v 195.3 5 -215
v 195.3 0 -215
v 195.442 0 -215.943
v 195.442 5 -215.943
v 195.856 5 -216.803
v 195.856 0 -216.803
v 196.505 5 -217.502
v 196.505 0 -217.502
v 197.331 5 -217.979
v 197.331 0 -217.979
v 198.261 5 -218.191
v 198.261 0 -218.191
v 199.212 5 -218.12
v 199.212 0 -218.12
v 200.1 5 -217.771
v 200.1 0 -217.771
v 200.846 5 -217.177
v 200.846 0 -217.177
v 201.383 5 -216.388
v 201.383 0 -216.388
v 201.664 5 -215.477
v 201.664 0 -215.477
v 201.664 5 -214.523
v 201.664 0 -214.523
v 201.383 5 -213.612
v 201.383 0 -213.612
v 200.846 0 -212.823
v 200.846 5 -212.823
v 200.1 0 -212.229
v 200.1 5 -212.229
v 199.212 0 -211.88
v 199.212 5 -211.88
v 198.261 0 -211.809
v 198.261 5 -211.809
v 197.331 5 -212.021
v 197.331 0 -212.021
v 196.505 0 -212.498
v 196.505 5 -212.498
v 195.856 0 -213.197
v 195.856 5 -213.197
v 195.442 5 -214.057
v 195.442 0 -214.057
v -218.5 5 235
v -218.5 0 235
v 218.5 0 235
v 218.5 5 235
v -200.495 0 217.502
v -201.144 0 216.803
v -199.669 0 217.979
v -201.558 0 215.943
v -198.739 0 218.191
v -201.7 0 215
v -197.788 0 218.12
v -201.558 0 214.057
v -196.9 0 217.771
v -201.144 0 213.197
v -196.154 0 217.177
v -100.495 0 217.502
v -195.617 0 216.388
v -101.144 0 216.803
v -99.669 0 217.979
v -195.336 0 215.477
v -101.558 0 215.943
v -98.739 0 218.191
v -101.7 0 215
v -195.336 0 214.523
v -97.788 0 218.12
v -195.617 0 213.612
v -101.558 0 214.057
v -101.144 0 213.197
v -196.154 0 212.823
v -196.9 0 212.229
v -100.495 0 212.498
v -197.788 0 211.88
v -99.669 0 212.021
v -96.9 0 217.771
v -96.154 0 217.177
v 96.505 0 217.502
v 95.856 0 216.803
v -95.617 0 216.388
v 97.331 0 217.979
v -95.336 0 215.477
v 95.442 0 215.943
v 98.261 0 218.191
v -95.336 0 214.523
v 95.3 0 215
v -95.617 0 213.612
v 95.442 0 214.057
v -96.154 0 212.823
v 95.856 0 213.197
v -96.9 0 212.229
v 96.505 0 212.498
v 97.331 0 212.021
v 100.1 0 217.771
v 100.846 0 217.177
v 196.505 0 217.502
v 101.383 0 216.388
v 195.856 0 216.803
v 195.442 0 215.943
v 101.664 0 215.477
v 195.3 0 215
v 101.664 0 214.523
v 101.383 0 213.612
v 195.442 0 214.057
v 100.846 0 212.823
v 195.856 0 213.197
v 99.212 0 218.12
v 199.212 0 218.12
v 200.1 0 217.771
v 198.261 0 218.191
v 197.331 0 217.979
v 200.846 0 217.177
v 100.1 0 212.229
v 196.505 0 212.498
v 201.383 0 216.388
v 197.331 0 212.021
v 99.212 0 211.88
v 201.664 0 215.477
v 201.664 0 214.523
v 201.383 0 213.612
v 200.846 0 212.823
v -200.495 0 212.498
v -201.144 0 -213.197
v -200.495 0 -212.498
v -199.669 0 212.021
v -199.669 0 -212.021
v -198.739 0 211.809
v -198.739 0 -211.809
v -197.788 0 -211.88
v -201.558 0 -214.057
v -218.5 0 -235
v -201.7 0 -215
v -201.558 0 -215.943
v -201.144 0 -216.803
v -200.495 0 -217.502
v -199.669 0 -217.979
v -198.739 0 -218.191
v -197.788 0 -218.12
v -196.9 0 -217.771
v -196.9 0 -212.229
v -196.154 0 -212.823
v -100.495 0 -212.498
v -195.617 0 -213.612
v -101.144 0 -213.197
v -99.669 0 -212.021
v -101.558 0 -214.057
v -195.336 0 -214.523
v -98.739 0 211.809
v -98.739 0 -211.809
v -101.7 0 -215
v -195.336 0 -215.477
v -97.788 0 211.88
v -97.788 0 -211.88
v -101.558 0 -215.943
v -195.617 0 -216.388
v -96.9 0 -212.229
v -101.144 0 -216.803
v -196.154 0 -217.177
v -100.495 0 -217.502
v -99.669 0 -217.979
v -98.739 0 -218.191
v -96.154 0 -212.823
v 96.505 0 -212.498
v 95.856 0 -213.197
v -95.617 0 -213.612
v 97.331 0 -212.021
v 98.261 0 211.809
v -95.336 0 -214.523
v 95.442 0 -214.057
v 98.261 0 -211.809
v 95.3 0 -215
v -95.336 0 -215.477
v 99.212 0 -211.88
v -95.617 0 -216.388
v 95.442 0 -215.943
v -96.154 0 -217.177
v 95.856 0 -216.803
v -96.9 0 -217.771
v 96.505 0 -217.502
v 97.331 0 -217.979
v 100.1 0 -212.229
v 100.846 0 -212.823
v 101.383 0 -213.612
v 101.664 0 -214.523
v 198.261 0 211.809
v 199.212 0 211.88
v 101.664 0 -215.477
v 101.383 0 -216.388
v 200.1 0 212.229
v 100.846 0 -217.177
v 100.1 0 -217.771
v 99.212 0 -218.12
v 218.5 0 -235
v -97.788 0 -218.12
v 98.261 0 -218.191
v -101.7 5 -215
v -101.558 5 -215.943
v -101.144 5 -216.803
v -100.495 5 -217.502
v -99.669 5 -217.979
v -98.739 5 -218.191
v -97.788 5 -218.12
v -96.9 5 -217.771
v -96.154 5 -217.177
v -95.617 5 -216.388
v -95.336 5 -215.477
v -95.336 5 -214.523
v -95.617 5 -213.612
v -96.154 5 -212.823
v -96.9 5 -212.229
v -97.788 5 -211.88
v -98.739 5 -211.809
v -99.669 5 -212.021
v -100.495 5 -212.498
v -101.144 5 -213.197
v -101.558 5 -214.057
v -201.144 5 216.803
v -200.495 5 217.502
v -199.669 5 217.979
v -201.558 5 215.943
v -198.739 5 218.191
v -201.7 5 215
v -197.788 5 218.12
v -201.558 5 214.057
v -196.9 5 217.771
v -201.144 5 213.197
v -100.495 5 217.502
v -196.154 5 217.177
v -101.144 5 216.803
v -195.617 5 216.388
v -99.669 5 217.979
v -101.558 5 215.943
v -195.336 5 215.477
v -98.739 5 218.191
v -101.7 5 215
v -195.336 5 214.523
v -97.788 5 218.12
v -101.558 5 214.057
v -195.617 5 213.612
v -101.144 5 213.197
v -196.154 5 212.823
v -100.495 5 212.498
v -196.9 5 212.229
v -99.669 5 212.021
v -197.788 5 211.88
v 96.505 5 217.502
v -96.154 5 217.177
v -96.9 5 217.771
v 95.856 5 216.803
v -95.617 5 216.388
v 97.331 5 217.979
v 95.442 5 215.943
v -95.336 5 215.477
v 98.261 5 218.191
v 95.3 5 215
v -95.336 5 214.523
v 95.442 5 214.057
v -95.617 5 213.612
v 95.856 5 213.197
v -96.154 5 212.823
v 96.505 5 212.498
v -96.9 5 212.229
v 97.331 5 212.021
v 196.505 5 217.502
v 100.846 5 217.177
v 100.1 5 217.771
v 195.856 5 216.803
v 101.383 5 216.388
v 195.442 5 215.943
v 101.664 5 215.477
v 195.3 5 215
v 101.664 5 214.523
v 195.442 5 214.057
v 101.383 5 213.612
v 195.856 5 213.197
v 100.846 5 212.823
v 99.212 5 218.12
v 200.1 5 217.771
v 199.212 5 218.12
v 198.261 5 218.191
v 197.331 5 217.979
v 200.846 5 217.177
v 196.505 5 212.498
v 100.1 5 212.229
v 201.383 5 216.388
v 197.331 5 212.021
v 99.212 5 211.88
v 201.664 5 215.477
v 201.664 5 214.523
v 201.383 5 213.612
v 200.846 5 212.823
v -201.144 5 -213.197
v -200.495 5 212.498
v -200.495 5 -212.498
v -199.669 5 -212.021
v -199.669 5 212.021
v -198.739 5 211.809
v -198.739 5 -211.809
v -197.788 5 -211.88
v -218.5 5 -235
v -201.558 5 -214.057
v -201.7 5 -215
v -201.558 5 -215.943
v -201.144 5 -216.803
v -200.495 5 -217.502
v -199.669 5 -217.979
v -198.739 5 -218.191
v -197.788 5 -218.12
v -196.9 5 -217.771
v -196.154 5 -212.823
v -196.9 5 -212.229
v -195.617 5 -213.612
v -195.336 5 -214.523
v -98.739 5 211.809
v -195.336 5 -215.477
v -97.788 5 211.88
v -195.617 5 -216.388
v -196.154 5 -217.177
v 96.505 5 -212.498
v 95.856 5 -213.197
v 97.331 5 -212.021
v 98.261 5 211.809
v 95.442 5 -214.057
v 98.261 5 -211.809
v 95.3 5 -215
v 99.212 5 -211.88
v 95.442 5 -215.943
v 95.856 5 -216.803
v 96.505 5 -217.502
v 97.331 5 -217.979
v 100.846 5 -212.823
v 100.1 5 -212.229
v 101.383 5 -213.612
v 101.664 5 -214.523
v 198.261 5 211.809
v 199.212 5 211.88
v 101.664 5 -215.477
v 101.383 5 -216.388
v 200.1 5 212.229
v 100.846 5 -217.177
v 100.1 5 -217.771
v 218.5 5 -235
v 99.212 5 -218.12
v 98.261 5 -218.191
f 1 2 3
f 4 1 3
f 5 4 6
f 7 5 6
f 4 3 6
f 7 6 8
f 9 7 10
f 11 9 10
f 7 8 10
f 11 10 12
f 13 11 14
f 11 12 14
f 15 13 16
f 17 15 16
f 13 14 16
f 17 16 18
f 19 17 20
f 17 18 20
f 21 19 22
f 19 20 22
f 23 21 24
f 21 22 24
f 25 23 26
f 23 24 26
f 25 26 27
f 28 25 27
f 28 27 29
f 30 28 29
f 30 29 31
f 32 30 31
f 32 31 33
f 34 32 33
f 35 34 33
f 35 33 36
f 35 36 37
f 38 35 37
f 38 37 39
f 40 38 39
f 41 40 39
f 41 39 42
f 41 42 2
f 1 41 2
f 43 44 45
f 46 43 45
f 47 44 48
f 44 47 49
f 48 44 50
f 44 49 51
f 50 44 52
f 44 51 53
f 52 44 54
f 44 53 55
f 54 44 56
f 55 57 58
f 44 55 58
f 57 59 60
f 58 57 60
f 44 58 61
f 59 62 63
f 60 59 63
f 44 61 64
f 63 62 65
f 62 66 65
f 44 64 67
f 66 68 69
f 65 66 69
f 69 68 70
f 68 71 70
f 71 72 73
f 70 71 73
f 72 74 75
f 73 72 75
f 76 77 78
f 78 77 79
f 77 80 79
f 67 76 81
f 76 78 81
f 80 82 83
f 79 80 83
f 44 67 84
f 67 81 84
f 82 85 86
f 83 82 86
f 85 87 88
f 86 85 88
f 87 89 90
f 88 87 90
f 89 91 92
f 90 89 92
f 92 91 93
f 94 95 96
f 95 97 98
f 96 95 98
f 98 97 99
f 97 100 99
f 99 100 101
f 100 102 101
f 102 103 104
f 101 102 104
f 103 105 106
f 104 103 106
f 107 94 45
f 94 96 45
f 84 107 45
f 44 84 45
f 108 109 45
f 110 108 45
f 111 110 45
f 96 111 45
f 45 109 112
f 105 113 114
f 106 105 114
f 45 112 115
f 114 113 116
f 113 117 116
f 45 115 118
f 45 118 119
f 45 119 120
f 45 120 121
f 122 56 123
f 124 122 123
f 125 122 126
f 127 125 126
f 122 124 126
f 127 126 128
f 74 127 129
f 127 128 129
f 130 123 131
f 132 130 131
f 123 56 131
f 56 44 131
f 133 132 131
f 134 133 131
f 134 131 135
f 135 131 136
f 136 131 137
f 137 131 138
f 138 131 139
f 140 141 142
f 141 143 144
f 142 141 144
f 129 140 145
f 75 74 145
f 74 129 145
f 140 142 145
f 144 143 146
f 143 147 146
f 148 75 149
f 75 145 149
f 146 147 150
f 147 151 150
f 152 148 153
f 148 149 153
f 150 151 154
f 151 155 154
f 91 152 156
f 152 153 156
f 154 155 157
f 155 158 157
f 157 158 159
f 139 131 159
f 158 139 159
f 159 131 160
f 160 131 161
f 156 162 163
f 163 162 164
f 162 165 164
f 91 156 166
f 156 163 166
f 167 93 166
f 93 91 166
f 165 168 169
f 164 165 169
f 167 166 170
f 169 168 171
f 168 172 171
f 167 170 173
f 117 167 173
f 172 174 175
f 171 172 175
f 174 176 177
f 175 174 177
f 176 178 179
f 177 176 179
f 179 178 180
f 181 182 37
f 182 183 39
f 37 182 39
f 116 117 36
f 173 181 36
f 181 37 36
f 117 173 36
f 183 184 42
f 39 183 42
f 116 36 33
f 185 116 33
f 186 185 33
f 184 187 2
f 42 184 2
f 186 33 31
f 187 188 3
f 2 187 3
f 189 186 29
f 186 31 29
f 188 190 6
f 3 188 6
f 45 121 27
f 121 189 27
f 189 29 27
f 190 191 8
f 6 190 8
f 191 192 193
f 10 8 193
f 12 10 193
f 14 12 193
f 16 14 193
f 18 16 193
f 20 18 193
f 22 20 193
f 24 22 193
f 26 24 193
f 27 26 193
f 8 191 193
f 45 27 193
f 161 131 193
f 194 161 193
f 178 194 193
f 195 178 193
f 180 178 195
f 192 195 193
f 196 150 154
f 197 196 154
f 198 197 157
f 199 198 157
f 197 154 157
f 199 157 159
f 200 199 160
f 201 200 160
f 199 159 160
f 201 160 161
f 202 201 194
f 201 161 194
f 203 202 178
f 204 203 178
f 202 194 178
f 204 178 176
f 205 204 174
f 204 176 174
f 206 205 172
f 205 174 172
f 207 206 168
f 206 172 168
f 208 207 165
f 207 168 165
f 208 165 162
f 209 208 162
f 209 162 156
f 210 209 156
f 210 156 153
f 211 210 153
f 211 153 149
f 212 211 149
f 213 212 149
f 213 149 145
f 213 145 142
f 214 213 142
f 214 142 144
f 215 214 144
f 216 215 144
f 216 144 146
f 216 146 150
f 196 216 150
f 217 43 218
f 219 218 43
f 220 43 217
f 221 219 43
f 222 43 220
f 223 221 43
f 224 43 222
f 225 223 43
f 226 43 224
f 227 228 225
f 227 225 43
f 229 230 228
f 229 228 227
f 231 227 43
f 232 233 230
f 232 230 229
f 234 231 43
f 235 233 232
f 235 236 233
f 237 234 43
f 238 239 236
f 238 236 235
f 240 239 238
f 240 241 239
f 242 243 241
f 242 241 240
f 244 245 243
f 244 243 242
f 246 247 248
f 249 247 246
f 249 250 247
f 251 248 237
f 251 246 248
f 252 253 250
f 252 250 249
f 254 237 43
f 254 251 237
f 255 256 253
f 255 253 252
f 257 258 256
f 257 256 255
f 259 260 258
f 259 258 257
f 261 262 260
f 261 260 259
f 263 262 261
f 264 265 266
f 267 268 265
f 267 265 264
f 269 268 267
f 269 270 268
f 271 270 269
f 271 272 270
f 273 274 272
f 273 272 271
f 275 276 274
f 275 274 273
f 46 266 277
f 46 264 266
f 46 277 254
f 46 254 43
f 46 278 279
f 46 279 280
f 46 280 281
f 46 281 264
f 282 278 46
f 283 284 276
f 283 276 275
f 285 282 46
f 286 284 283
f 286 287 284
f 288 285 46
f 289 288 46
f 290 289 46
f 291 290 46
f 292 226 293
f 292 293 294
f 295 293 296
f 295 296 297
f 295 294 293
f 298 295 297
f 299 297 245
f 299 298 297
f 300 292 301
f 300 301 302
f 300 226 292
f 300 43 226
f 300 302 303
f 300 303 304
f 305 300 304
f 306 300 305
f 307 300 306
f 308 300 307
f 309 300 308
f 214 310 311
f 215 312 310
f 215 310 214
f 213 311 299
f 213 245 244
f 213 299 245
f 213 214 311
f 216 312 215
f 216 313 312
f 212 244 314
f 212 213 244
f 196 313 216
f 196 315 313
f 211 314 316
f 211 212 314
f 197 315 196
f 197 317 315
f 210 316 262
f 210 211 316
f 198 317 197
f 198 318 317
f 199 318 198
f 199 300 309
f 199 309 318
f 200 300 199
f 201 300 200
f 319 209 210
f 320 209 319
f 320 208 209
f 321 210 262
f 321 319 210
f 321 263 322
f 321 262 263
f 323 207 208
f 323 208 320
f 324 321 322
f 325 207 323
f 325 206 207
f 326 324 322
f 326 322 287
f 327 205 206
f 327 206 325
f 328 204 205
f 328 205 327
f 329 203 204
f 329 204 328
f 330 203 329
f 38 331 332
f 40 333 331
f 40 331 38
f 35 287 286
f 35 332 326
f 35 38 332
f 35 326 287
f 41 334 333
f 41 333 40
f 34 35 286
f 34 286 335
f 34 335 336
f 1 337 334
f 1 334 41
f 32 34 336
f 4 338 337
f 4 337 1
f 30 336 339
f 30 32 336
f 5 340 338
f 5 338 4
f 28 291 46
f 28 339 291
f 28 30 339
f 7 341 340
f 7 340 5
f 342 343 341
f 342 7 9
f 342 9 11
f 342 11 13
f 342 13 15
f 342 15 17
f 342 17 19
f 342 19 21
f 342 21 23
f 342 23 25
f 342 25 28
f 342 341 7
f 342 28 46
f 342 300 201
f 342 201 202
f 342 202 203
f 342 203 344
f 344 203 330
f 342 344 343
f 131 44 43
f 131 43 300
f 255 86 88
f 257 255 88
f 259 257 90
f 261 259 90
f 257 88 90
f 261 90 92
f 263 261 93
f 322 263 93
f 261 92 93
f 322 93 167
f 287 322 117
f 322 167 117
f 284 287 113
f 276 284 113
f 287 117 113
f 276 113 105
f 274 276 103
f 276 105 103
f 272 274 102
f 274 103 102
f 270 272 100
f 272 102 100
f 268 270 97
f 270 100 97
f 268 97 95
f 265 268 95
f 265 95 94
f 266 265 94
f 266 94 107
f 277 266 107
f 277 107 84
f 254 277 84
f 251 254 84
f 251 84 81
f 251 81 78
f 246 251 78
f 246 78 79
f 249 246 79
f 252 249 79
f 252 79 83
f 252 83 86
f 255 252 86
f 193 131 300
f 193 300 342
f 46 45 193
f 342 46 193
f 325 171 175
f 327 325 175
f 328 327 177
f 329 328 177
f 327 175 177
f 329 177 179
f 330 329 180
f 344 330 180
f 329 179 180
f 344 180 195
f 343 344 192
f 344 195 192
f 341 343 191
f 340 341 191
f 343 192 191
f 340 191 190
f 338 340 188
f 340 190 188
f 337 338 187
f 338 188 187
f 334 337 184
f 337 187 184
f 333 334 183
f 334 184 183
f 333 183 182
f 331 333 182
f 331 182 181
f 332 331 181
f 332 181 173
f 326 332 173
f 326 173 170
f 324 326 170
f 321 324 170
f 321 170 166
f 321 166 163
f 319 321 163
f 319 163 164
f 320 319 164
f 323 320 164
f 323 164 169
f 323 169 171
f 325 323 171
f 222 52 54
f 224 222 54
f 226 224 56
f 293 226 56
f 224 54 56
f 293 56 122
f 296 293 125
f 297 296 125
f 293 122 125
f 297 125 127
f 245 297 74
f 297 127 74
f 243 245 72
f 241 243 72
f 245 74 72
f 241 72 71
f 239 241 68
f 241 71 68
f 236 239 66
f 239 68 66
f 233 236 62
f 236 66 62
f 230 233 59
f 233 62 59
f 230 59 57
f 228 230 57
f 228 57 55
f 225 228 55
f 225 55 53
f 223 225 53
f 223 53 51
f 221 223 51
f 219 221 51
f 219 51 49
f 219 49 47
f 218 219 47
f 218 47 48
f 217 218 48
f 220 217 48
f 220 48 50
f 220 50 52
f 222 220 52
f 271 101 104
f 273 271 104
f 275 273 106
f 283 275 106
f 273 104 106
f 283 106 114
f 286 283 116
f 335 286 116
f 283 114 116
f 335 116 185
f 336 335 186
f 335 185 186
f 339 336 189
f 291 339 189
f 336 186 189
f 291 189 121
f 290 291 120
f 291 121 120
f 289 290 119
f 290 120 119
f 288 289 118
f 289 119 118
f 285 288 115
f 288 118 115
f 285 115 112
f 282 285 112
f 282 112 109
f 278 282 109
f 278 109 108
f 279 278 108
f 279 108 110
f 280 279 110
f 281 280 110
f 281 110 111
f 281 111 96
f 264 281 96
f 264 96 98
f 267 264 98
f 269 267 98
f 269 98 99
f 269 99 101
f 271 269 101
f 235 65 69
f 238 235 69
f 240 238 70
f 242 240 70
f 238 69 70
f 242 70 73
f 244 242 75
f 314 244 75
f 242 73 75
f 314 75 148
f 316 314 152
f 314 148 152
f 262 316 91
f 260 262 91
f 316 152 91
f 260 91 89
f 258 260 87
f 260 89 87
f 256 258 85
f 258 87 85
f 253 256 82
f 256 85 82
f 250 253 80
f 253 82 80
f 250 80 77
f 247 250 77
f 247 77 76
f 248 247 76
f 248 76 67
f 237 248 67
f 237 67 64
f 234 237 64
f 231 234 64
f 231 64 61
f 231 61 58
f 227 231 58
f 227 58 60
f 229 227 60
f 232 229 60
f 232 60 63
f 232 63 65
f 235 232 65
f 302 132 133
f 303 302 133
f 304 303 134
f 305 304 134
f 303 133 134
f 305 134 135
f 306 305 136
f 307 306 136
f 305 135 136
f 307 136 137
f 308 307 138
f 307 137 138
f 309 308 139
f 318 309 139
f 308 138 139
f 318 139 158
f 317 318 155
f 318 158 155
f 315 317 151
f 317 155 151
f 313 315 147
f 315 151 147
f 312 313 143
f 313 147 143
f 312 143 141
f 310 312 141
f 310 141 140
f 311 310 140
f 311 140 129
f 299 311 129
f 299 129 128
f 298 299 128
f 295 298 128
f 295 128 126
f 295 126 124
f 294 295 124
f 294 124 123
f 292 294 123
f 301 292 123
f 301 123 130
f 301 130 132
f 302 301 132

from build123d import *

# Parameters (mm, degrees)
SKETCH1_W                = 437
SKETCH1_H                = 470
BOSS_EXTRUDE1_DEPTH      = 5
M6_CLEARANCE_HOLE1_D     = 6.4
M6_CLEARANCE_HOLE1_DEPTH = 10
M6_CLEARANCE_HOLE1_TIP   = 1.922753981


with BuildPart() as part:
    # Sketch1 → Boss-Extrude1 (new body)
    with BuildSketch(Plane(origin=(0, 0, 0), x_dir=(1, 0, 0), z_dir=(0, 1, 0))):
        Rectangle(SKETCH1_W, SKETCH1_H)
    extrude(amount=BOSS_EXTRUDE1_DEPTH)

    # M6 Clearance Hole1
    with Locations(Plane(origin=(0, 5, 0), x_dir=(1, 0, 0), z_dir=(0, 1, 0))):
        with Locations((-198.5, 215), (-98.5, 215), (98.5, 215), (198.5, 215), (-198.5, -215), (-98.5, -215), (98.5, -215), (198.5, -215)):
            Hole(M6_CLEARANCE_HOLE1_D / 2, depth=M6_CLEARANCE_HOLE1_DEPTH)
            with Locations((0, 0, -(M6_CLEARANCE_HOLE1_DEPTH + M6_CLEARANCE_HOLE1_TIP / 2))):  # 118° drill point
                Cone(0, M6_CLEARANCE_HOLE1_D / 2, M6_CLEARANCE_HOLE1_TIP, mode=Mode.SUBTRACT)


solid = part.part
